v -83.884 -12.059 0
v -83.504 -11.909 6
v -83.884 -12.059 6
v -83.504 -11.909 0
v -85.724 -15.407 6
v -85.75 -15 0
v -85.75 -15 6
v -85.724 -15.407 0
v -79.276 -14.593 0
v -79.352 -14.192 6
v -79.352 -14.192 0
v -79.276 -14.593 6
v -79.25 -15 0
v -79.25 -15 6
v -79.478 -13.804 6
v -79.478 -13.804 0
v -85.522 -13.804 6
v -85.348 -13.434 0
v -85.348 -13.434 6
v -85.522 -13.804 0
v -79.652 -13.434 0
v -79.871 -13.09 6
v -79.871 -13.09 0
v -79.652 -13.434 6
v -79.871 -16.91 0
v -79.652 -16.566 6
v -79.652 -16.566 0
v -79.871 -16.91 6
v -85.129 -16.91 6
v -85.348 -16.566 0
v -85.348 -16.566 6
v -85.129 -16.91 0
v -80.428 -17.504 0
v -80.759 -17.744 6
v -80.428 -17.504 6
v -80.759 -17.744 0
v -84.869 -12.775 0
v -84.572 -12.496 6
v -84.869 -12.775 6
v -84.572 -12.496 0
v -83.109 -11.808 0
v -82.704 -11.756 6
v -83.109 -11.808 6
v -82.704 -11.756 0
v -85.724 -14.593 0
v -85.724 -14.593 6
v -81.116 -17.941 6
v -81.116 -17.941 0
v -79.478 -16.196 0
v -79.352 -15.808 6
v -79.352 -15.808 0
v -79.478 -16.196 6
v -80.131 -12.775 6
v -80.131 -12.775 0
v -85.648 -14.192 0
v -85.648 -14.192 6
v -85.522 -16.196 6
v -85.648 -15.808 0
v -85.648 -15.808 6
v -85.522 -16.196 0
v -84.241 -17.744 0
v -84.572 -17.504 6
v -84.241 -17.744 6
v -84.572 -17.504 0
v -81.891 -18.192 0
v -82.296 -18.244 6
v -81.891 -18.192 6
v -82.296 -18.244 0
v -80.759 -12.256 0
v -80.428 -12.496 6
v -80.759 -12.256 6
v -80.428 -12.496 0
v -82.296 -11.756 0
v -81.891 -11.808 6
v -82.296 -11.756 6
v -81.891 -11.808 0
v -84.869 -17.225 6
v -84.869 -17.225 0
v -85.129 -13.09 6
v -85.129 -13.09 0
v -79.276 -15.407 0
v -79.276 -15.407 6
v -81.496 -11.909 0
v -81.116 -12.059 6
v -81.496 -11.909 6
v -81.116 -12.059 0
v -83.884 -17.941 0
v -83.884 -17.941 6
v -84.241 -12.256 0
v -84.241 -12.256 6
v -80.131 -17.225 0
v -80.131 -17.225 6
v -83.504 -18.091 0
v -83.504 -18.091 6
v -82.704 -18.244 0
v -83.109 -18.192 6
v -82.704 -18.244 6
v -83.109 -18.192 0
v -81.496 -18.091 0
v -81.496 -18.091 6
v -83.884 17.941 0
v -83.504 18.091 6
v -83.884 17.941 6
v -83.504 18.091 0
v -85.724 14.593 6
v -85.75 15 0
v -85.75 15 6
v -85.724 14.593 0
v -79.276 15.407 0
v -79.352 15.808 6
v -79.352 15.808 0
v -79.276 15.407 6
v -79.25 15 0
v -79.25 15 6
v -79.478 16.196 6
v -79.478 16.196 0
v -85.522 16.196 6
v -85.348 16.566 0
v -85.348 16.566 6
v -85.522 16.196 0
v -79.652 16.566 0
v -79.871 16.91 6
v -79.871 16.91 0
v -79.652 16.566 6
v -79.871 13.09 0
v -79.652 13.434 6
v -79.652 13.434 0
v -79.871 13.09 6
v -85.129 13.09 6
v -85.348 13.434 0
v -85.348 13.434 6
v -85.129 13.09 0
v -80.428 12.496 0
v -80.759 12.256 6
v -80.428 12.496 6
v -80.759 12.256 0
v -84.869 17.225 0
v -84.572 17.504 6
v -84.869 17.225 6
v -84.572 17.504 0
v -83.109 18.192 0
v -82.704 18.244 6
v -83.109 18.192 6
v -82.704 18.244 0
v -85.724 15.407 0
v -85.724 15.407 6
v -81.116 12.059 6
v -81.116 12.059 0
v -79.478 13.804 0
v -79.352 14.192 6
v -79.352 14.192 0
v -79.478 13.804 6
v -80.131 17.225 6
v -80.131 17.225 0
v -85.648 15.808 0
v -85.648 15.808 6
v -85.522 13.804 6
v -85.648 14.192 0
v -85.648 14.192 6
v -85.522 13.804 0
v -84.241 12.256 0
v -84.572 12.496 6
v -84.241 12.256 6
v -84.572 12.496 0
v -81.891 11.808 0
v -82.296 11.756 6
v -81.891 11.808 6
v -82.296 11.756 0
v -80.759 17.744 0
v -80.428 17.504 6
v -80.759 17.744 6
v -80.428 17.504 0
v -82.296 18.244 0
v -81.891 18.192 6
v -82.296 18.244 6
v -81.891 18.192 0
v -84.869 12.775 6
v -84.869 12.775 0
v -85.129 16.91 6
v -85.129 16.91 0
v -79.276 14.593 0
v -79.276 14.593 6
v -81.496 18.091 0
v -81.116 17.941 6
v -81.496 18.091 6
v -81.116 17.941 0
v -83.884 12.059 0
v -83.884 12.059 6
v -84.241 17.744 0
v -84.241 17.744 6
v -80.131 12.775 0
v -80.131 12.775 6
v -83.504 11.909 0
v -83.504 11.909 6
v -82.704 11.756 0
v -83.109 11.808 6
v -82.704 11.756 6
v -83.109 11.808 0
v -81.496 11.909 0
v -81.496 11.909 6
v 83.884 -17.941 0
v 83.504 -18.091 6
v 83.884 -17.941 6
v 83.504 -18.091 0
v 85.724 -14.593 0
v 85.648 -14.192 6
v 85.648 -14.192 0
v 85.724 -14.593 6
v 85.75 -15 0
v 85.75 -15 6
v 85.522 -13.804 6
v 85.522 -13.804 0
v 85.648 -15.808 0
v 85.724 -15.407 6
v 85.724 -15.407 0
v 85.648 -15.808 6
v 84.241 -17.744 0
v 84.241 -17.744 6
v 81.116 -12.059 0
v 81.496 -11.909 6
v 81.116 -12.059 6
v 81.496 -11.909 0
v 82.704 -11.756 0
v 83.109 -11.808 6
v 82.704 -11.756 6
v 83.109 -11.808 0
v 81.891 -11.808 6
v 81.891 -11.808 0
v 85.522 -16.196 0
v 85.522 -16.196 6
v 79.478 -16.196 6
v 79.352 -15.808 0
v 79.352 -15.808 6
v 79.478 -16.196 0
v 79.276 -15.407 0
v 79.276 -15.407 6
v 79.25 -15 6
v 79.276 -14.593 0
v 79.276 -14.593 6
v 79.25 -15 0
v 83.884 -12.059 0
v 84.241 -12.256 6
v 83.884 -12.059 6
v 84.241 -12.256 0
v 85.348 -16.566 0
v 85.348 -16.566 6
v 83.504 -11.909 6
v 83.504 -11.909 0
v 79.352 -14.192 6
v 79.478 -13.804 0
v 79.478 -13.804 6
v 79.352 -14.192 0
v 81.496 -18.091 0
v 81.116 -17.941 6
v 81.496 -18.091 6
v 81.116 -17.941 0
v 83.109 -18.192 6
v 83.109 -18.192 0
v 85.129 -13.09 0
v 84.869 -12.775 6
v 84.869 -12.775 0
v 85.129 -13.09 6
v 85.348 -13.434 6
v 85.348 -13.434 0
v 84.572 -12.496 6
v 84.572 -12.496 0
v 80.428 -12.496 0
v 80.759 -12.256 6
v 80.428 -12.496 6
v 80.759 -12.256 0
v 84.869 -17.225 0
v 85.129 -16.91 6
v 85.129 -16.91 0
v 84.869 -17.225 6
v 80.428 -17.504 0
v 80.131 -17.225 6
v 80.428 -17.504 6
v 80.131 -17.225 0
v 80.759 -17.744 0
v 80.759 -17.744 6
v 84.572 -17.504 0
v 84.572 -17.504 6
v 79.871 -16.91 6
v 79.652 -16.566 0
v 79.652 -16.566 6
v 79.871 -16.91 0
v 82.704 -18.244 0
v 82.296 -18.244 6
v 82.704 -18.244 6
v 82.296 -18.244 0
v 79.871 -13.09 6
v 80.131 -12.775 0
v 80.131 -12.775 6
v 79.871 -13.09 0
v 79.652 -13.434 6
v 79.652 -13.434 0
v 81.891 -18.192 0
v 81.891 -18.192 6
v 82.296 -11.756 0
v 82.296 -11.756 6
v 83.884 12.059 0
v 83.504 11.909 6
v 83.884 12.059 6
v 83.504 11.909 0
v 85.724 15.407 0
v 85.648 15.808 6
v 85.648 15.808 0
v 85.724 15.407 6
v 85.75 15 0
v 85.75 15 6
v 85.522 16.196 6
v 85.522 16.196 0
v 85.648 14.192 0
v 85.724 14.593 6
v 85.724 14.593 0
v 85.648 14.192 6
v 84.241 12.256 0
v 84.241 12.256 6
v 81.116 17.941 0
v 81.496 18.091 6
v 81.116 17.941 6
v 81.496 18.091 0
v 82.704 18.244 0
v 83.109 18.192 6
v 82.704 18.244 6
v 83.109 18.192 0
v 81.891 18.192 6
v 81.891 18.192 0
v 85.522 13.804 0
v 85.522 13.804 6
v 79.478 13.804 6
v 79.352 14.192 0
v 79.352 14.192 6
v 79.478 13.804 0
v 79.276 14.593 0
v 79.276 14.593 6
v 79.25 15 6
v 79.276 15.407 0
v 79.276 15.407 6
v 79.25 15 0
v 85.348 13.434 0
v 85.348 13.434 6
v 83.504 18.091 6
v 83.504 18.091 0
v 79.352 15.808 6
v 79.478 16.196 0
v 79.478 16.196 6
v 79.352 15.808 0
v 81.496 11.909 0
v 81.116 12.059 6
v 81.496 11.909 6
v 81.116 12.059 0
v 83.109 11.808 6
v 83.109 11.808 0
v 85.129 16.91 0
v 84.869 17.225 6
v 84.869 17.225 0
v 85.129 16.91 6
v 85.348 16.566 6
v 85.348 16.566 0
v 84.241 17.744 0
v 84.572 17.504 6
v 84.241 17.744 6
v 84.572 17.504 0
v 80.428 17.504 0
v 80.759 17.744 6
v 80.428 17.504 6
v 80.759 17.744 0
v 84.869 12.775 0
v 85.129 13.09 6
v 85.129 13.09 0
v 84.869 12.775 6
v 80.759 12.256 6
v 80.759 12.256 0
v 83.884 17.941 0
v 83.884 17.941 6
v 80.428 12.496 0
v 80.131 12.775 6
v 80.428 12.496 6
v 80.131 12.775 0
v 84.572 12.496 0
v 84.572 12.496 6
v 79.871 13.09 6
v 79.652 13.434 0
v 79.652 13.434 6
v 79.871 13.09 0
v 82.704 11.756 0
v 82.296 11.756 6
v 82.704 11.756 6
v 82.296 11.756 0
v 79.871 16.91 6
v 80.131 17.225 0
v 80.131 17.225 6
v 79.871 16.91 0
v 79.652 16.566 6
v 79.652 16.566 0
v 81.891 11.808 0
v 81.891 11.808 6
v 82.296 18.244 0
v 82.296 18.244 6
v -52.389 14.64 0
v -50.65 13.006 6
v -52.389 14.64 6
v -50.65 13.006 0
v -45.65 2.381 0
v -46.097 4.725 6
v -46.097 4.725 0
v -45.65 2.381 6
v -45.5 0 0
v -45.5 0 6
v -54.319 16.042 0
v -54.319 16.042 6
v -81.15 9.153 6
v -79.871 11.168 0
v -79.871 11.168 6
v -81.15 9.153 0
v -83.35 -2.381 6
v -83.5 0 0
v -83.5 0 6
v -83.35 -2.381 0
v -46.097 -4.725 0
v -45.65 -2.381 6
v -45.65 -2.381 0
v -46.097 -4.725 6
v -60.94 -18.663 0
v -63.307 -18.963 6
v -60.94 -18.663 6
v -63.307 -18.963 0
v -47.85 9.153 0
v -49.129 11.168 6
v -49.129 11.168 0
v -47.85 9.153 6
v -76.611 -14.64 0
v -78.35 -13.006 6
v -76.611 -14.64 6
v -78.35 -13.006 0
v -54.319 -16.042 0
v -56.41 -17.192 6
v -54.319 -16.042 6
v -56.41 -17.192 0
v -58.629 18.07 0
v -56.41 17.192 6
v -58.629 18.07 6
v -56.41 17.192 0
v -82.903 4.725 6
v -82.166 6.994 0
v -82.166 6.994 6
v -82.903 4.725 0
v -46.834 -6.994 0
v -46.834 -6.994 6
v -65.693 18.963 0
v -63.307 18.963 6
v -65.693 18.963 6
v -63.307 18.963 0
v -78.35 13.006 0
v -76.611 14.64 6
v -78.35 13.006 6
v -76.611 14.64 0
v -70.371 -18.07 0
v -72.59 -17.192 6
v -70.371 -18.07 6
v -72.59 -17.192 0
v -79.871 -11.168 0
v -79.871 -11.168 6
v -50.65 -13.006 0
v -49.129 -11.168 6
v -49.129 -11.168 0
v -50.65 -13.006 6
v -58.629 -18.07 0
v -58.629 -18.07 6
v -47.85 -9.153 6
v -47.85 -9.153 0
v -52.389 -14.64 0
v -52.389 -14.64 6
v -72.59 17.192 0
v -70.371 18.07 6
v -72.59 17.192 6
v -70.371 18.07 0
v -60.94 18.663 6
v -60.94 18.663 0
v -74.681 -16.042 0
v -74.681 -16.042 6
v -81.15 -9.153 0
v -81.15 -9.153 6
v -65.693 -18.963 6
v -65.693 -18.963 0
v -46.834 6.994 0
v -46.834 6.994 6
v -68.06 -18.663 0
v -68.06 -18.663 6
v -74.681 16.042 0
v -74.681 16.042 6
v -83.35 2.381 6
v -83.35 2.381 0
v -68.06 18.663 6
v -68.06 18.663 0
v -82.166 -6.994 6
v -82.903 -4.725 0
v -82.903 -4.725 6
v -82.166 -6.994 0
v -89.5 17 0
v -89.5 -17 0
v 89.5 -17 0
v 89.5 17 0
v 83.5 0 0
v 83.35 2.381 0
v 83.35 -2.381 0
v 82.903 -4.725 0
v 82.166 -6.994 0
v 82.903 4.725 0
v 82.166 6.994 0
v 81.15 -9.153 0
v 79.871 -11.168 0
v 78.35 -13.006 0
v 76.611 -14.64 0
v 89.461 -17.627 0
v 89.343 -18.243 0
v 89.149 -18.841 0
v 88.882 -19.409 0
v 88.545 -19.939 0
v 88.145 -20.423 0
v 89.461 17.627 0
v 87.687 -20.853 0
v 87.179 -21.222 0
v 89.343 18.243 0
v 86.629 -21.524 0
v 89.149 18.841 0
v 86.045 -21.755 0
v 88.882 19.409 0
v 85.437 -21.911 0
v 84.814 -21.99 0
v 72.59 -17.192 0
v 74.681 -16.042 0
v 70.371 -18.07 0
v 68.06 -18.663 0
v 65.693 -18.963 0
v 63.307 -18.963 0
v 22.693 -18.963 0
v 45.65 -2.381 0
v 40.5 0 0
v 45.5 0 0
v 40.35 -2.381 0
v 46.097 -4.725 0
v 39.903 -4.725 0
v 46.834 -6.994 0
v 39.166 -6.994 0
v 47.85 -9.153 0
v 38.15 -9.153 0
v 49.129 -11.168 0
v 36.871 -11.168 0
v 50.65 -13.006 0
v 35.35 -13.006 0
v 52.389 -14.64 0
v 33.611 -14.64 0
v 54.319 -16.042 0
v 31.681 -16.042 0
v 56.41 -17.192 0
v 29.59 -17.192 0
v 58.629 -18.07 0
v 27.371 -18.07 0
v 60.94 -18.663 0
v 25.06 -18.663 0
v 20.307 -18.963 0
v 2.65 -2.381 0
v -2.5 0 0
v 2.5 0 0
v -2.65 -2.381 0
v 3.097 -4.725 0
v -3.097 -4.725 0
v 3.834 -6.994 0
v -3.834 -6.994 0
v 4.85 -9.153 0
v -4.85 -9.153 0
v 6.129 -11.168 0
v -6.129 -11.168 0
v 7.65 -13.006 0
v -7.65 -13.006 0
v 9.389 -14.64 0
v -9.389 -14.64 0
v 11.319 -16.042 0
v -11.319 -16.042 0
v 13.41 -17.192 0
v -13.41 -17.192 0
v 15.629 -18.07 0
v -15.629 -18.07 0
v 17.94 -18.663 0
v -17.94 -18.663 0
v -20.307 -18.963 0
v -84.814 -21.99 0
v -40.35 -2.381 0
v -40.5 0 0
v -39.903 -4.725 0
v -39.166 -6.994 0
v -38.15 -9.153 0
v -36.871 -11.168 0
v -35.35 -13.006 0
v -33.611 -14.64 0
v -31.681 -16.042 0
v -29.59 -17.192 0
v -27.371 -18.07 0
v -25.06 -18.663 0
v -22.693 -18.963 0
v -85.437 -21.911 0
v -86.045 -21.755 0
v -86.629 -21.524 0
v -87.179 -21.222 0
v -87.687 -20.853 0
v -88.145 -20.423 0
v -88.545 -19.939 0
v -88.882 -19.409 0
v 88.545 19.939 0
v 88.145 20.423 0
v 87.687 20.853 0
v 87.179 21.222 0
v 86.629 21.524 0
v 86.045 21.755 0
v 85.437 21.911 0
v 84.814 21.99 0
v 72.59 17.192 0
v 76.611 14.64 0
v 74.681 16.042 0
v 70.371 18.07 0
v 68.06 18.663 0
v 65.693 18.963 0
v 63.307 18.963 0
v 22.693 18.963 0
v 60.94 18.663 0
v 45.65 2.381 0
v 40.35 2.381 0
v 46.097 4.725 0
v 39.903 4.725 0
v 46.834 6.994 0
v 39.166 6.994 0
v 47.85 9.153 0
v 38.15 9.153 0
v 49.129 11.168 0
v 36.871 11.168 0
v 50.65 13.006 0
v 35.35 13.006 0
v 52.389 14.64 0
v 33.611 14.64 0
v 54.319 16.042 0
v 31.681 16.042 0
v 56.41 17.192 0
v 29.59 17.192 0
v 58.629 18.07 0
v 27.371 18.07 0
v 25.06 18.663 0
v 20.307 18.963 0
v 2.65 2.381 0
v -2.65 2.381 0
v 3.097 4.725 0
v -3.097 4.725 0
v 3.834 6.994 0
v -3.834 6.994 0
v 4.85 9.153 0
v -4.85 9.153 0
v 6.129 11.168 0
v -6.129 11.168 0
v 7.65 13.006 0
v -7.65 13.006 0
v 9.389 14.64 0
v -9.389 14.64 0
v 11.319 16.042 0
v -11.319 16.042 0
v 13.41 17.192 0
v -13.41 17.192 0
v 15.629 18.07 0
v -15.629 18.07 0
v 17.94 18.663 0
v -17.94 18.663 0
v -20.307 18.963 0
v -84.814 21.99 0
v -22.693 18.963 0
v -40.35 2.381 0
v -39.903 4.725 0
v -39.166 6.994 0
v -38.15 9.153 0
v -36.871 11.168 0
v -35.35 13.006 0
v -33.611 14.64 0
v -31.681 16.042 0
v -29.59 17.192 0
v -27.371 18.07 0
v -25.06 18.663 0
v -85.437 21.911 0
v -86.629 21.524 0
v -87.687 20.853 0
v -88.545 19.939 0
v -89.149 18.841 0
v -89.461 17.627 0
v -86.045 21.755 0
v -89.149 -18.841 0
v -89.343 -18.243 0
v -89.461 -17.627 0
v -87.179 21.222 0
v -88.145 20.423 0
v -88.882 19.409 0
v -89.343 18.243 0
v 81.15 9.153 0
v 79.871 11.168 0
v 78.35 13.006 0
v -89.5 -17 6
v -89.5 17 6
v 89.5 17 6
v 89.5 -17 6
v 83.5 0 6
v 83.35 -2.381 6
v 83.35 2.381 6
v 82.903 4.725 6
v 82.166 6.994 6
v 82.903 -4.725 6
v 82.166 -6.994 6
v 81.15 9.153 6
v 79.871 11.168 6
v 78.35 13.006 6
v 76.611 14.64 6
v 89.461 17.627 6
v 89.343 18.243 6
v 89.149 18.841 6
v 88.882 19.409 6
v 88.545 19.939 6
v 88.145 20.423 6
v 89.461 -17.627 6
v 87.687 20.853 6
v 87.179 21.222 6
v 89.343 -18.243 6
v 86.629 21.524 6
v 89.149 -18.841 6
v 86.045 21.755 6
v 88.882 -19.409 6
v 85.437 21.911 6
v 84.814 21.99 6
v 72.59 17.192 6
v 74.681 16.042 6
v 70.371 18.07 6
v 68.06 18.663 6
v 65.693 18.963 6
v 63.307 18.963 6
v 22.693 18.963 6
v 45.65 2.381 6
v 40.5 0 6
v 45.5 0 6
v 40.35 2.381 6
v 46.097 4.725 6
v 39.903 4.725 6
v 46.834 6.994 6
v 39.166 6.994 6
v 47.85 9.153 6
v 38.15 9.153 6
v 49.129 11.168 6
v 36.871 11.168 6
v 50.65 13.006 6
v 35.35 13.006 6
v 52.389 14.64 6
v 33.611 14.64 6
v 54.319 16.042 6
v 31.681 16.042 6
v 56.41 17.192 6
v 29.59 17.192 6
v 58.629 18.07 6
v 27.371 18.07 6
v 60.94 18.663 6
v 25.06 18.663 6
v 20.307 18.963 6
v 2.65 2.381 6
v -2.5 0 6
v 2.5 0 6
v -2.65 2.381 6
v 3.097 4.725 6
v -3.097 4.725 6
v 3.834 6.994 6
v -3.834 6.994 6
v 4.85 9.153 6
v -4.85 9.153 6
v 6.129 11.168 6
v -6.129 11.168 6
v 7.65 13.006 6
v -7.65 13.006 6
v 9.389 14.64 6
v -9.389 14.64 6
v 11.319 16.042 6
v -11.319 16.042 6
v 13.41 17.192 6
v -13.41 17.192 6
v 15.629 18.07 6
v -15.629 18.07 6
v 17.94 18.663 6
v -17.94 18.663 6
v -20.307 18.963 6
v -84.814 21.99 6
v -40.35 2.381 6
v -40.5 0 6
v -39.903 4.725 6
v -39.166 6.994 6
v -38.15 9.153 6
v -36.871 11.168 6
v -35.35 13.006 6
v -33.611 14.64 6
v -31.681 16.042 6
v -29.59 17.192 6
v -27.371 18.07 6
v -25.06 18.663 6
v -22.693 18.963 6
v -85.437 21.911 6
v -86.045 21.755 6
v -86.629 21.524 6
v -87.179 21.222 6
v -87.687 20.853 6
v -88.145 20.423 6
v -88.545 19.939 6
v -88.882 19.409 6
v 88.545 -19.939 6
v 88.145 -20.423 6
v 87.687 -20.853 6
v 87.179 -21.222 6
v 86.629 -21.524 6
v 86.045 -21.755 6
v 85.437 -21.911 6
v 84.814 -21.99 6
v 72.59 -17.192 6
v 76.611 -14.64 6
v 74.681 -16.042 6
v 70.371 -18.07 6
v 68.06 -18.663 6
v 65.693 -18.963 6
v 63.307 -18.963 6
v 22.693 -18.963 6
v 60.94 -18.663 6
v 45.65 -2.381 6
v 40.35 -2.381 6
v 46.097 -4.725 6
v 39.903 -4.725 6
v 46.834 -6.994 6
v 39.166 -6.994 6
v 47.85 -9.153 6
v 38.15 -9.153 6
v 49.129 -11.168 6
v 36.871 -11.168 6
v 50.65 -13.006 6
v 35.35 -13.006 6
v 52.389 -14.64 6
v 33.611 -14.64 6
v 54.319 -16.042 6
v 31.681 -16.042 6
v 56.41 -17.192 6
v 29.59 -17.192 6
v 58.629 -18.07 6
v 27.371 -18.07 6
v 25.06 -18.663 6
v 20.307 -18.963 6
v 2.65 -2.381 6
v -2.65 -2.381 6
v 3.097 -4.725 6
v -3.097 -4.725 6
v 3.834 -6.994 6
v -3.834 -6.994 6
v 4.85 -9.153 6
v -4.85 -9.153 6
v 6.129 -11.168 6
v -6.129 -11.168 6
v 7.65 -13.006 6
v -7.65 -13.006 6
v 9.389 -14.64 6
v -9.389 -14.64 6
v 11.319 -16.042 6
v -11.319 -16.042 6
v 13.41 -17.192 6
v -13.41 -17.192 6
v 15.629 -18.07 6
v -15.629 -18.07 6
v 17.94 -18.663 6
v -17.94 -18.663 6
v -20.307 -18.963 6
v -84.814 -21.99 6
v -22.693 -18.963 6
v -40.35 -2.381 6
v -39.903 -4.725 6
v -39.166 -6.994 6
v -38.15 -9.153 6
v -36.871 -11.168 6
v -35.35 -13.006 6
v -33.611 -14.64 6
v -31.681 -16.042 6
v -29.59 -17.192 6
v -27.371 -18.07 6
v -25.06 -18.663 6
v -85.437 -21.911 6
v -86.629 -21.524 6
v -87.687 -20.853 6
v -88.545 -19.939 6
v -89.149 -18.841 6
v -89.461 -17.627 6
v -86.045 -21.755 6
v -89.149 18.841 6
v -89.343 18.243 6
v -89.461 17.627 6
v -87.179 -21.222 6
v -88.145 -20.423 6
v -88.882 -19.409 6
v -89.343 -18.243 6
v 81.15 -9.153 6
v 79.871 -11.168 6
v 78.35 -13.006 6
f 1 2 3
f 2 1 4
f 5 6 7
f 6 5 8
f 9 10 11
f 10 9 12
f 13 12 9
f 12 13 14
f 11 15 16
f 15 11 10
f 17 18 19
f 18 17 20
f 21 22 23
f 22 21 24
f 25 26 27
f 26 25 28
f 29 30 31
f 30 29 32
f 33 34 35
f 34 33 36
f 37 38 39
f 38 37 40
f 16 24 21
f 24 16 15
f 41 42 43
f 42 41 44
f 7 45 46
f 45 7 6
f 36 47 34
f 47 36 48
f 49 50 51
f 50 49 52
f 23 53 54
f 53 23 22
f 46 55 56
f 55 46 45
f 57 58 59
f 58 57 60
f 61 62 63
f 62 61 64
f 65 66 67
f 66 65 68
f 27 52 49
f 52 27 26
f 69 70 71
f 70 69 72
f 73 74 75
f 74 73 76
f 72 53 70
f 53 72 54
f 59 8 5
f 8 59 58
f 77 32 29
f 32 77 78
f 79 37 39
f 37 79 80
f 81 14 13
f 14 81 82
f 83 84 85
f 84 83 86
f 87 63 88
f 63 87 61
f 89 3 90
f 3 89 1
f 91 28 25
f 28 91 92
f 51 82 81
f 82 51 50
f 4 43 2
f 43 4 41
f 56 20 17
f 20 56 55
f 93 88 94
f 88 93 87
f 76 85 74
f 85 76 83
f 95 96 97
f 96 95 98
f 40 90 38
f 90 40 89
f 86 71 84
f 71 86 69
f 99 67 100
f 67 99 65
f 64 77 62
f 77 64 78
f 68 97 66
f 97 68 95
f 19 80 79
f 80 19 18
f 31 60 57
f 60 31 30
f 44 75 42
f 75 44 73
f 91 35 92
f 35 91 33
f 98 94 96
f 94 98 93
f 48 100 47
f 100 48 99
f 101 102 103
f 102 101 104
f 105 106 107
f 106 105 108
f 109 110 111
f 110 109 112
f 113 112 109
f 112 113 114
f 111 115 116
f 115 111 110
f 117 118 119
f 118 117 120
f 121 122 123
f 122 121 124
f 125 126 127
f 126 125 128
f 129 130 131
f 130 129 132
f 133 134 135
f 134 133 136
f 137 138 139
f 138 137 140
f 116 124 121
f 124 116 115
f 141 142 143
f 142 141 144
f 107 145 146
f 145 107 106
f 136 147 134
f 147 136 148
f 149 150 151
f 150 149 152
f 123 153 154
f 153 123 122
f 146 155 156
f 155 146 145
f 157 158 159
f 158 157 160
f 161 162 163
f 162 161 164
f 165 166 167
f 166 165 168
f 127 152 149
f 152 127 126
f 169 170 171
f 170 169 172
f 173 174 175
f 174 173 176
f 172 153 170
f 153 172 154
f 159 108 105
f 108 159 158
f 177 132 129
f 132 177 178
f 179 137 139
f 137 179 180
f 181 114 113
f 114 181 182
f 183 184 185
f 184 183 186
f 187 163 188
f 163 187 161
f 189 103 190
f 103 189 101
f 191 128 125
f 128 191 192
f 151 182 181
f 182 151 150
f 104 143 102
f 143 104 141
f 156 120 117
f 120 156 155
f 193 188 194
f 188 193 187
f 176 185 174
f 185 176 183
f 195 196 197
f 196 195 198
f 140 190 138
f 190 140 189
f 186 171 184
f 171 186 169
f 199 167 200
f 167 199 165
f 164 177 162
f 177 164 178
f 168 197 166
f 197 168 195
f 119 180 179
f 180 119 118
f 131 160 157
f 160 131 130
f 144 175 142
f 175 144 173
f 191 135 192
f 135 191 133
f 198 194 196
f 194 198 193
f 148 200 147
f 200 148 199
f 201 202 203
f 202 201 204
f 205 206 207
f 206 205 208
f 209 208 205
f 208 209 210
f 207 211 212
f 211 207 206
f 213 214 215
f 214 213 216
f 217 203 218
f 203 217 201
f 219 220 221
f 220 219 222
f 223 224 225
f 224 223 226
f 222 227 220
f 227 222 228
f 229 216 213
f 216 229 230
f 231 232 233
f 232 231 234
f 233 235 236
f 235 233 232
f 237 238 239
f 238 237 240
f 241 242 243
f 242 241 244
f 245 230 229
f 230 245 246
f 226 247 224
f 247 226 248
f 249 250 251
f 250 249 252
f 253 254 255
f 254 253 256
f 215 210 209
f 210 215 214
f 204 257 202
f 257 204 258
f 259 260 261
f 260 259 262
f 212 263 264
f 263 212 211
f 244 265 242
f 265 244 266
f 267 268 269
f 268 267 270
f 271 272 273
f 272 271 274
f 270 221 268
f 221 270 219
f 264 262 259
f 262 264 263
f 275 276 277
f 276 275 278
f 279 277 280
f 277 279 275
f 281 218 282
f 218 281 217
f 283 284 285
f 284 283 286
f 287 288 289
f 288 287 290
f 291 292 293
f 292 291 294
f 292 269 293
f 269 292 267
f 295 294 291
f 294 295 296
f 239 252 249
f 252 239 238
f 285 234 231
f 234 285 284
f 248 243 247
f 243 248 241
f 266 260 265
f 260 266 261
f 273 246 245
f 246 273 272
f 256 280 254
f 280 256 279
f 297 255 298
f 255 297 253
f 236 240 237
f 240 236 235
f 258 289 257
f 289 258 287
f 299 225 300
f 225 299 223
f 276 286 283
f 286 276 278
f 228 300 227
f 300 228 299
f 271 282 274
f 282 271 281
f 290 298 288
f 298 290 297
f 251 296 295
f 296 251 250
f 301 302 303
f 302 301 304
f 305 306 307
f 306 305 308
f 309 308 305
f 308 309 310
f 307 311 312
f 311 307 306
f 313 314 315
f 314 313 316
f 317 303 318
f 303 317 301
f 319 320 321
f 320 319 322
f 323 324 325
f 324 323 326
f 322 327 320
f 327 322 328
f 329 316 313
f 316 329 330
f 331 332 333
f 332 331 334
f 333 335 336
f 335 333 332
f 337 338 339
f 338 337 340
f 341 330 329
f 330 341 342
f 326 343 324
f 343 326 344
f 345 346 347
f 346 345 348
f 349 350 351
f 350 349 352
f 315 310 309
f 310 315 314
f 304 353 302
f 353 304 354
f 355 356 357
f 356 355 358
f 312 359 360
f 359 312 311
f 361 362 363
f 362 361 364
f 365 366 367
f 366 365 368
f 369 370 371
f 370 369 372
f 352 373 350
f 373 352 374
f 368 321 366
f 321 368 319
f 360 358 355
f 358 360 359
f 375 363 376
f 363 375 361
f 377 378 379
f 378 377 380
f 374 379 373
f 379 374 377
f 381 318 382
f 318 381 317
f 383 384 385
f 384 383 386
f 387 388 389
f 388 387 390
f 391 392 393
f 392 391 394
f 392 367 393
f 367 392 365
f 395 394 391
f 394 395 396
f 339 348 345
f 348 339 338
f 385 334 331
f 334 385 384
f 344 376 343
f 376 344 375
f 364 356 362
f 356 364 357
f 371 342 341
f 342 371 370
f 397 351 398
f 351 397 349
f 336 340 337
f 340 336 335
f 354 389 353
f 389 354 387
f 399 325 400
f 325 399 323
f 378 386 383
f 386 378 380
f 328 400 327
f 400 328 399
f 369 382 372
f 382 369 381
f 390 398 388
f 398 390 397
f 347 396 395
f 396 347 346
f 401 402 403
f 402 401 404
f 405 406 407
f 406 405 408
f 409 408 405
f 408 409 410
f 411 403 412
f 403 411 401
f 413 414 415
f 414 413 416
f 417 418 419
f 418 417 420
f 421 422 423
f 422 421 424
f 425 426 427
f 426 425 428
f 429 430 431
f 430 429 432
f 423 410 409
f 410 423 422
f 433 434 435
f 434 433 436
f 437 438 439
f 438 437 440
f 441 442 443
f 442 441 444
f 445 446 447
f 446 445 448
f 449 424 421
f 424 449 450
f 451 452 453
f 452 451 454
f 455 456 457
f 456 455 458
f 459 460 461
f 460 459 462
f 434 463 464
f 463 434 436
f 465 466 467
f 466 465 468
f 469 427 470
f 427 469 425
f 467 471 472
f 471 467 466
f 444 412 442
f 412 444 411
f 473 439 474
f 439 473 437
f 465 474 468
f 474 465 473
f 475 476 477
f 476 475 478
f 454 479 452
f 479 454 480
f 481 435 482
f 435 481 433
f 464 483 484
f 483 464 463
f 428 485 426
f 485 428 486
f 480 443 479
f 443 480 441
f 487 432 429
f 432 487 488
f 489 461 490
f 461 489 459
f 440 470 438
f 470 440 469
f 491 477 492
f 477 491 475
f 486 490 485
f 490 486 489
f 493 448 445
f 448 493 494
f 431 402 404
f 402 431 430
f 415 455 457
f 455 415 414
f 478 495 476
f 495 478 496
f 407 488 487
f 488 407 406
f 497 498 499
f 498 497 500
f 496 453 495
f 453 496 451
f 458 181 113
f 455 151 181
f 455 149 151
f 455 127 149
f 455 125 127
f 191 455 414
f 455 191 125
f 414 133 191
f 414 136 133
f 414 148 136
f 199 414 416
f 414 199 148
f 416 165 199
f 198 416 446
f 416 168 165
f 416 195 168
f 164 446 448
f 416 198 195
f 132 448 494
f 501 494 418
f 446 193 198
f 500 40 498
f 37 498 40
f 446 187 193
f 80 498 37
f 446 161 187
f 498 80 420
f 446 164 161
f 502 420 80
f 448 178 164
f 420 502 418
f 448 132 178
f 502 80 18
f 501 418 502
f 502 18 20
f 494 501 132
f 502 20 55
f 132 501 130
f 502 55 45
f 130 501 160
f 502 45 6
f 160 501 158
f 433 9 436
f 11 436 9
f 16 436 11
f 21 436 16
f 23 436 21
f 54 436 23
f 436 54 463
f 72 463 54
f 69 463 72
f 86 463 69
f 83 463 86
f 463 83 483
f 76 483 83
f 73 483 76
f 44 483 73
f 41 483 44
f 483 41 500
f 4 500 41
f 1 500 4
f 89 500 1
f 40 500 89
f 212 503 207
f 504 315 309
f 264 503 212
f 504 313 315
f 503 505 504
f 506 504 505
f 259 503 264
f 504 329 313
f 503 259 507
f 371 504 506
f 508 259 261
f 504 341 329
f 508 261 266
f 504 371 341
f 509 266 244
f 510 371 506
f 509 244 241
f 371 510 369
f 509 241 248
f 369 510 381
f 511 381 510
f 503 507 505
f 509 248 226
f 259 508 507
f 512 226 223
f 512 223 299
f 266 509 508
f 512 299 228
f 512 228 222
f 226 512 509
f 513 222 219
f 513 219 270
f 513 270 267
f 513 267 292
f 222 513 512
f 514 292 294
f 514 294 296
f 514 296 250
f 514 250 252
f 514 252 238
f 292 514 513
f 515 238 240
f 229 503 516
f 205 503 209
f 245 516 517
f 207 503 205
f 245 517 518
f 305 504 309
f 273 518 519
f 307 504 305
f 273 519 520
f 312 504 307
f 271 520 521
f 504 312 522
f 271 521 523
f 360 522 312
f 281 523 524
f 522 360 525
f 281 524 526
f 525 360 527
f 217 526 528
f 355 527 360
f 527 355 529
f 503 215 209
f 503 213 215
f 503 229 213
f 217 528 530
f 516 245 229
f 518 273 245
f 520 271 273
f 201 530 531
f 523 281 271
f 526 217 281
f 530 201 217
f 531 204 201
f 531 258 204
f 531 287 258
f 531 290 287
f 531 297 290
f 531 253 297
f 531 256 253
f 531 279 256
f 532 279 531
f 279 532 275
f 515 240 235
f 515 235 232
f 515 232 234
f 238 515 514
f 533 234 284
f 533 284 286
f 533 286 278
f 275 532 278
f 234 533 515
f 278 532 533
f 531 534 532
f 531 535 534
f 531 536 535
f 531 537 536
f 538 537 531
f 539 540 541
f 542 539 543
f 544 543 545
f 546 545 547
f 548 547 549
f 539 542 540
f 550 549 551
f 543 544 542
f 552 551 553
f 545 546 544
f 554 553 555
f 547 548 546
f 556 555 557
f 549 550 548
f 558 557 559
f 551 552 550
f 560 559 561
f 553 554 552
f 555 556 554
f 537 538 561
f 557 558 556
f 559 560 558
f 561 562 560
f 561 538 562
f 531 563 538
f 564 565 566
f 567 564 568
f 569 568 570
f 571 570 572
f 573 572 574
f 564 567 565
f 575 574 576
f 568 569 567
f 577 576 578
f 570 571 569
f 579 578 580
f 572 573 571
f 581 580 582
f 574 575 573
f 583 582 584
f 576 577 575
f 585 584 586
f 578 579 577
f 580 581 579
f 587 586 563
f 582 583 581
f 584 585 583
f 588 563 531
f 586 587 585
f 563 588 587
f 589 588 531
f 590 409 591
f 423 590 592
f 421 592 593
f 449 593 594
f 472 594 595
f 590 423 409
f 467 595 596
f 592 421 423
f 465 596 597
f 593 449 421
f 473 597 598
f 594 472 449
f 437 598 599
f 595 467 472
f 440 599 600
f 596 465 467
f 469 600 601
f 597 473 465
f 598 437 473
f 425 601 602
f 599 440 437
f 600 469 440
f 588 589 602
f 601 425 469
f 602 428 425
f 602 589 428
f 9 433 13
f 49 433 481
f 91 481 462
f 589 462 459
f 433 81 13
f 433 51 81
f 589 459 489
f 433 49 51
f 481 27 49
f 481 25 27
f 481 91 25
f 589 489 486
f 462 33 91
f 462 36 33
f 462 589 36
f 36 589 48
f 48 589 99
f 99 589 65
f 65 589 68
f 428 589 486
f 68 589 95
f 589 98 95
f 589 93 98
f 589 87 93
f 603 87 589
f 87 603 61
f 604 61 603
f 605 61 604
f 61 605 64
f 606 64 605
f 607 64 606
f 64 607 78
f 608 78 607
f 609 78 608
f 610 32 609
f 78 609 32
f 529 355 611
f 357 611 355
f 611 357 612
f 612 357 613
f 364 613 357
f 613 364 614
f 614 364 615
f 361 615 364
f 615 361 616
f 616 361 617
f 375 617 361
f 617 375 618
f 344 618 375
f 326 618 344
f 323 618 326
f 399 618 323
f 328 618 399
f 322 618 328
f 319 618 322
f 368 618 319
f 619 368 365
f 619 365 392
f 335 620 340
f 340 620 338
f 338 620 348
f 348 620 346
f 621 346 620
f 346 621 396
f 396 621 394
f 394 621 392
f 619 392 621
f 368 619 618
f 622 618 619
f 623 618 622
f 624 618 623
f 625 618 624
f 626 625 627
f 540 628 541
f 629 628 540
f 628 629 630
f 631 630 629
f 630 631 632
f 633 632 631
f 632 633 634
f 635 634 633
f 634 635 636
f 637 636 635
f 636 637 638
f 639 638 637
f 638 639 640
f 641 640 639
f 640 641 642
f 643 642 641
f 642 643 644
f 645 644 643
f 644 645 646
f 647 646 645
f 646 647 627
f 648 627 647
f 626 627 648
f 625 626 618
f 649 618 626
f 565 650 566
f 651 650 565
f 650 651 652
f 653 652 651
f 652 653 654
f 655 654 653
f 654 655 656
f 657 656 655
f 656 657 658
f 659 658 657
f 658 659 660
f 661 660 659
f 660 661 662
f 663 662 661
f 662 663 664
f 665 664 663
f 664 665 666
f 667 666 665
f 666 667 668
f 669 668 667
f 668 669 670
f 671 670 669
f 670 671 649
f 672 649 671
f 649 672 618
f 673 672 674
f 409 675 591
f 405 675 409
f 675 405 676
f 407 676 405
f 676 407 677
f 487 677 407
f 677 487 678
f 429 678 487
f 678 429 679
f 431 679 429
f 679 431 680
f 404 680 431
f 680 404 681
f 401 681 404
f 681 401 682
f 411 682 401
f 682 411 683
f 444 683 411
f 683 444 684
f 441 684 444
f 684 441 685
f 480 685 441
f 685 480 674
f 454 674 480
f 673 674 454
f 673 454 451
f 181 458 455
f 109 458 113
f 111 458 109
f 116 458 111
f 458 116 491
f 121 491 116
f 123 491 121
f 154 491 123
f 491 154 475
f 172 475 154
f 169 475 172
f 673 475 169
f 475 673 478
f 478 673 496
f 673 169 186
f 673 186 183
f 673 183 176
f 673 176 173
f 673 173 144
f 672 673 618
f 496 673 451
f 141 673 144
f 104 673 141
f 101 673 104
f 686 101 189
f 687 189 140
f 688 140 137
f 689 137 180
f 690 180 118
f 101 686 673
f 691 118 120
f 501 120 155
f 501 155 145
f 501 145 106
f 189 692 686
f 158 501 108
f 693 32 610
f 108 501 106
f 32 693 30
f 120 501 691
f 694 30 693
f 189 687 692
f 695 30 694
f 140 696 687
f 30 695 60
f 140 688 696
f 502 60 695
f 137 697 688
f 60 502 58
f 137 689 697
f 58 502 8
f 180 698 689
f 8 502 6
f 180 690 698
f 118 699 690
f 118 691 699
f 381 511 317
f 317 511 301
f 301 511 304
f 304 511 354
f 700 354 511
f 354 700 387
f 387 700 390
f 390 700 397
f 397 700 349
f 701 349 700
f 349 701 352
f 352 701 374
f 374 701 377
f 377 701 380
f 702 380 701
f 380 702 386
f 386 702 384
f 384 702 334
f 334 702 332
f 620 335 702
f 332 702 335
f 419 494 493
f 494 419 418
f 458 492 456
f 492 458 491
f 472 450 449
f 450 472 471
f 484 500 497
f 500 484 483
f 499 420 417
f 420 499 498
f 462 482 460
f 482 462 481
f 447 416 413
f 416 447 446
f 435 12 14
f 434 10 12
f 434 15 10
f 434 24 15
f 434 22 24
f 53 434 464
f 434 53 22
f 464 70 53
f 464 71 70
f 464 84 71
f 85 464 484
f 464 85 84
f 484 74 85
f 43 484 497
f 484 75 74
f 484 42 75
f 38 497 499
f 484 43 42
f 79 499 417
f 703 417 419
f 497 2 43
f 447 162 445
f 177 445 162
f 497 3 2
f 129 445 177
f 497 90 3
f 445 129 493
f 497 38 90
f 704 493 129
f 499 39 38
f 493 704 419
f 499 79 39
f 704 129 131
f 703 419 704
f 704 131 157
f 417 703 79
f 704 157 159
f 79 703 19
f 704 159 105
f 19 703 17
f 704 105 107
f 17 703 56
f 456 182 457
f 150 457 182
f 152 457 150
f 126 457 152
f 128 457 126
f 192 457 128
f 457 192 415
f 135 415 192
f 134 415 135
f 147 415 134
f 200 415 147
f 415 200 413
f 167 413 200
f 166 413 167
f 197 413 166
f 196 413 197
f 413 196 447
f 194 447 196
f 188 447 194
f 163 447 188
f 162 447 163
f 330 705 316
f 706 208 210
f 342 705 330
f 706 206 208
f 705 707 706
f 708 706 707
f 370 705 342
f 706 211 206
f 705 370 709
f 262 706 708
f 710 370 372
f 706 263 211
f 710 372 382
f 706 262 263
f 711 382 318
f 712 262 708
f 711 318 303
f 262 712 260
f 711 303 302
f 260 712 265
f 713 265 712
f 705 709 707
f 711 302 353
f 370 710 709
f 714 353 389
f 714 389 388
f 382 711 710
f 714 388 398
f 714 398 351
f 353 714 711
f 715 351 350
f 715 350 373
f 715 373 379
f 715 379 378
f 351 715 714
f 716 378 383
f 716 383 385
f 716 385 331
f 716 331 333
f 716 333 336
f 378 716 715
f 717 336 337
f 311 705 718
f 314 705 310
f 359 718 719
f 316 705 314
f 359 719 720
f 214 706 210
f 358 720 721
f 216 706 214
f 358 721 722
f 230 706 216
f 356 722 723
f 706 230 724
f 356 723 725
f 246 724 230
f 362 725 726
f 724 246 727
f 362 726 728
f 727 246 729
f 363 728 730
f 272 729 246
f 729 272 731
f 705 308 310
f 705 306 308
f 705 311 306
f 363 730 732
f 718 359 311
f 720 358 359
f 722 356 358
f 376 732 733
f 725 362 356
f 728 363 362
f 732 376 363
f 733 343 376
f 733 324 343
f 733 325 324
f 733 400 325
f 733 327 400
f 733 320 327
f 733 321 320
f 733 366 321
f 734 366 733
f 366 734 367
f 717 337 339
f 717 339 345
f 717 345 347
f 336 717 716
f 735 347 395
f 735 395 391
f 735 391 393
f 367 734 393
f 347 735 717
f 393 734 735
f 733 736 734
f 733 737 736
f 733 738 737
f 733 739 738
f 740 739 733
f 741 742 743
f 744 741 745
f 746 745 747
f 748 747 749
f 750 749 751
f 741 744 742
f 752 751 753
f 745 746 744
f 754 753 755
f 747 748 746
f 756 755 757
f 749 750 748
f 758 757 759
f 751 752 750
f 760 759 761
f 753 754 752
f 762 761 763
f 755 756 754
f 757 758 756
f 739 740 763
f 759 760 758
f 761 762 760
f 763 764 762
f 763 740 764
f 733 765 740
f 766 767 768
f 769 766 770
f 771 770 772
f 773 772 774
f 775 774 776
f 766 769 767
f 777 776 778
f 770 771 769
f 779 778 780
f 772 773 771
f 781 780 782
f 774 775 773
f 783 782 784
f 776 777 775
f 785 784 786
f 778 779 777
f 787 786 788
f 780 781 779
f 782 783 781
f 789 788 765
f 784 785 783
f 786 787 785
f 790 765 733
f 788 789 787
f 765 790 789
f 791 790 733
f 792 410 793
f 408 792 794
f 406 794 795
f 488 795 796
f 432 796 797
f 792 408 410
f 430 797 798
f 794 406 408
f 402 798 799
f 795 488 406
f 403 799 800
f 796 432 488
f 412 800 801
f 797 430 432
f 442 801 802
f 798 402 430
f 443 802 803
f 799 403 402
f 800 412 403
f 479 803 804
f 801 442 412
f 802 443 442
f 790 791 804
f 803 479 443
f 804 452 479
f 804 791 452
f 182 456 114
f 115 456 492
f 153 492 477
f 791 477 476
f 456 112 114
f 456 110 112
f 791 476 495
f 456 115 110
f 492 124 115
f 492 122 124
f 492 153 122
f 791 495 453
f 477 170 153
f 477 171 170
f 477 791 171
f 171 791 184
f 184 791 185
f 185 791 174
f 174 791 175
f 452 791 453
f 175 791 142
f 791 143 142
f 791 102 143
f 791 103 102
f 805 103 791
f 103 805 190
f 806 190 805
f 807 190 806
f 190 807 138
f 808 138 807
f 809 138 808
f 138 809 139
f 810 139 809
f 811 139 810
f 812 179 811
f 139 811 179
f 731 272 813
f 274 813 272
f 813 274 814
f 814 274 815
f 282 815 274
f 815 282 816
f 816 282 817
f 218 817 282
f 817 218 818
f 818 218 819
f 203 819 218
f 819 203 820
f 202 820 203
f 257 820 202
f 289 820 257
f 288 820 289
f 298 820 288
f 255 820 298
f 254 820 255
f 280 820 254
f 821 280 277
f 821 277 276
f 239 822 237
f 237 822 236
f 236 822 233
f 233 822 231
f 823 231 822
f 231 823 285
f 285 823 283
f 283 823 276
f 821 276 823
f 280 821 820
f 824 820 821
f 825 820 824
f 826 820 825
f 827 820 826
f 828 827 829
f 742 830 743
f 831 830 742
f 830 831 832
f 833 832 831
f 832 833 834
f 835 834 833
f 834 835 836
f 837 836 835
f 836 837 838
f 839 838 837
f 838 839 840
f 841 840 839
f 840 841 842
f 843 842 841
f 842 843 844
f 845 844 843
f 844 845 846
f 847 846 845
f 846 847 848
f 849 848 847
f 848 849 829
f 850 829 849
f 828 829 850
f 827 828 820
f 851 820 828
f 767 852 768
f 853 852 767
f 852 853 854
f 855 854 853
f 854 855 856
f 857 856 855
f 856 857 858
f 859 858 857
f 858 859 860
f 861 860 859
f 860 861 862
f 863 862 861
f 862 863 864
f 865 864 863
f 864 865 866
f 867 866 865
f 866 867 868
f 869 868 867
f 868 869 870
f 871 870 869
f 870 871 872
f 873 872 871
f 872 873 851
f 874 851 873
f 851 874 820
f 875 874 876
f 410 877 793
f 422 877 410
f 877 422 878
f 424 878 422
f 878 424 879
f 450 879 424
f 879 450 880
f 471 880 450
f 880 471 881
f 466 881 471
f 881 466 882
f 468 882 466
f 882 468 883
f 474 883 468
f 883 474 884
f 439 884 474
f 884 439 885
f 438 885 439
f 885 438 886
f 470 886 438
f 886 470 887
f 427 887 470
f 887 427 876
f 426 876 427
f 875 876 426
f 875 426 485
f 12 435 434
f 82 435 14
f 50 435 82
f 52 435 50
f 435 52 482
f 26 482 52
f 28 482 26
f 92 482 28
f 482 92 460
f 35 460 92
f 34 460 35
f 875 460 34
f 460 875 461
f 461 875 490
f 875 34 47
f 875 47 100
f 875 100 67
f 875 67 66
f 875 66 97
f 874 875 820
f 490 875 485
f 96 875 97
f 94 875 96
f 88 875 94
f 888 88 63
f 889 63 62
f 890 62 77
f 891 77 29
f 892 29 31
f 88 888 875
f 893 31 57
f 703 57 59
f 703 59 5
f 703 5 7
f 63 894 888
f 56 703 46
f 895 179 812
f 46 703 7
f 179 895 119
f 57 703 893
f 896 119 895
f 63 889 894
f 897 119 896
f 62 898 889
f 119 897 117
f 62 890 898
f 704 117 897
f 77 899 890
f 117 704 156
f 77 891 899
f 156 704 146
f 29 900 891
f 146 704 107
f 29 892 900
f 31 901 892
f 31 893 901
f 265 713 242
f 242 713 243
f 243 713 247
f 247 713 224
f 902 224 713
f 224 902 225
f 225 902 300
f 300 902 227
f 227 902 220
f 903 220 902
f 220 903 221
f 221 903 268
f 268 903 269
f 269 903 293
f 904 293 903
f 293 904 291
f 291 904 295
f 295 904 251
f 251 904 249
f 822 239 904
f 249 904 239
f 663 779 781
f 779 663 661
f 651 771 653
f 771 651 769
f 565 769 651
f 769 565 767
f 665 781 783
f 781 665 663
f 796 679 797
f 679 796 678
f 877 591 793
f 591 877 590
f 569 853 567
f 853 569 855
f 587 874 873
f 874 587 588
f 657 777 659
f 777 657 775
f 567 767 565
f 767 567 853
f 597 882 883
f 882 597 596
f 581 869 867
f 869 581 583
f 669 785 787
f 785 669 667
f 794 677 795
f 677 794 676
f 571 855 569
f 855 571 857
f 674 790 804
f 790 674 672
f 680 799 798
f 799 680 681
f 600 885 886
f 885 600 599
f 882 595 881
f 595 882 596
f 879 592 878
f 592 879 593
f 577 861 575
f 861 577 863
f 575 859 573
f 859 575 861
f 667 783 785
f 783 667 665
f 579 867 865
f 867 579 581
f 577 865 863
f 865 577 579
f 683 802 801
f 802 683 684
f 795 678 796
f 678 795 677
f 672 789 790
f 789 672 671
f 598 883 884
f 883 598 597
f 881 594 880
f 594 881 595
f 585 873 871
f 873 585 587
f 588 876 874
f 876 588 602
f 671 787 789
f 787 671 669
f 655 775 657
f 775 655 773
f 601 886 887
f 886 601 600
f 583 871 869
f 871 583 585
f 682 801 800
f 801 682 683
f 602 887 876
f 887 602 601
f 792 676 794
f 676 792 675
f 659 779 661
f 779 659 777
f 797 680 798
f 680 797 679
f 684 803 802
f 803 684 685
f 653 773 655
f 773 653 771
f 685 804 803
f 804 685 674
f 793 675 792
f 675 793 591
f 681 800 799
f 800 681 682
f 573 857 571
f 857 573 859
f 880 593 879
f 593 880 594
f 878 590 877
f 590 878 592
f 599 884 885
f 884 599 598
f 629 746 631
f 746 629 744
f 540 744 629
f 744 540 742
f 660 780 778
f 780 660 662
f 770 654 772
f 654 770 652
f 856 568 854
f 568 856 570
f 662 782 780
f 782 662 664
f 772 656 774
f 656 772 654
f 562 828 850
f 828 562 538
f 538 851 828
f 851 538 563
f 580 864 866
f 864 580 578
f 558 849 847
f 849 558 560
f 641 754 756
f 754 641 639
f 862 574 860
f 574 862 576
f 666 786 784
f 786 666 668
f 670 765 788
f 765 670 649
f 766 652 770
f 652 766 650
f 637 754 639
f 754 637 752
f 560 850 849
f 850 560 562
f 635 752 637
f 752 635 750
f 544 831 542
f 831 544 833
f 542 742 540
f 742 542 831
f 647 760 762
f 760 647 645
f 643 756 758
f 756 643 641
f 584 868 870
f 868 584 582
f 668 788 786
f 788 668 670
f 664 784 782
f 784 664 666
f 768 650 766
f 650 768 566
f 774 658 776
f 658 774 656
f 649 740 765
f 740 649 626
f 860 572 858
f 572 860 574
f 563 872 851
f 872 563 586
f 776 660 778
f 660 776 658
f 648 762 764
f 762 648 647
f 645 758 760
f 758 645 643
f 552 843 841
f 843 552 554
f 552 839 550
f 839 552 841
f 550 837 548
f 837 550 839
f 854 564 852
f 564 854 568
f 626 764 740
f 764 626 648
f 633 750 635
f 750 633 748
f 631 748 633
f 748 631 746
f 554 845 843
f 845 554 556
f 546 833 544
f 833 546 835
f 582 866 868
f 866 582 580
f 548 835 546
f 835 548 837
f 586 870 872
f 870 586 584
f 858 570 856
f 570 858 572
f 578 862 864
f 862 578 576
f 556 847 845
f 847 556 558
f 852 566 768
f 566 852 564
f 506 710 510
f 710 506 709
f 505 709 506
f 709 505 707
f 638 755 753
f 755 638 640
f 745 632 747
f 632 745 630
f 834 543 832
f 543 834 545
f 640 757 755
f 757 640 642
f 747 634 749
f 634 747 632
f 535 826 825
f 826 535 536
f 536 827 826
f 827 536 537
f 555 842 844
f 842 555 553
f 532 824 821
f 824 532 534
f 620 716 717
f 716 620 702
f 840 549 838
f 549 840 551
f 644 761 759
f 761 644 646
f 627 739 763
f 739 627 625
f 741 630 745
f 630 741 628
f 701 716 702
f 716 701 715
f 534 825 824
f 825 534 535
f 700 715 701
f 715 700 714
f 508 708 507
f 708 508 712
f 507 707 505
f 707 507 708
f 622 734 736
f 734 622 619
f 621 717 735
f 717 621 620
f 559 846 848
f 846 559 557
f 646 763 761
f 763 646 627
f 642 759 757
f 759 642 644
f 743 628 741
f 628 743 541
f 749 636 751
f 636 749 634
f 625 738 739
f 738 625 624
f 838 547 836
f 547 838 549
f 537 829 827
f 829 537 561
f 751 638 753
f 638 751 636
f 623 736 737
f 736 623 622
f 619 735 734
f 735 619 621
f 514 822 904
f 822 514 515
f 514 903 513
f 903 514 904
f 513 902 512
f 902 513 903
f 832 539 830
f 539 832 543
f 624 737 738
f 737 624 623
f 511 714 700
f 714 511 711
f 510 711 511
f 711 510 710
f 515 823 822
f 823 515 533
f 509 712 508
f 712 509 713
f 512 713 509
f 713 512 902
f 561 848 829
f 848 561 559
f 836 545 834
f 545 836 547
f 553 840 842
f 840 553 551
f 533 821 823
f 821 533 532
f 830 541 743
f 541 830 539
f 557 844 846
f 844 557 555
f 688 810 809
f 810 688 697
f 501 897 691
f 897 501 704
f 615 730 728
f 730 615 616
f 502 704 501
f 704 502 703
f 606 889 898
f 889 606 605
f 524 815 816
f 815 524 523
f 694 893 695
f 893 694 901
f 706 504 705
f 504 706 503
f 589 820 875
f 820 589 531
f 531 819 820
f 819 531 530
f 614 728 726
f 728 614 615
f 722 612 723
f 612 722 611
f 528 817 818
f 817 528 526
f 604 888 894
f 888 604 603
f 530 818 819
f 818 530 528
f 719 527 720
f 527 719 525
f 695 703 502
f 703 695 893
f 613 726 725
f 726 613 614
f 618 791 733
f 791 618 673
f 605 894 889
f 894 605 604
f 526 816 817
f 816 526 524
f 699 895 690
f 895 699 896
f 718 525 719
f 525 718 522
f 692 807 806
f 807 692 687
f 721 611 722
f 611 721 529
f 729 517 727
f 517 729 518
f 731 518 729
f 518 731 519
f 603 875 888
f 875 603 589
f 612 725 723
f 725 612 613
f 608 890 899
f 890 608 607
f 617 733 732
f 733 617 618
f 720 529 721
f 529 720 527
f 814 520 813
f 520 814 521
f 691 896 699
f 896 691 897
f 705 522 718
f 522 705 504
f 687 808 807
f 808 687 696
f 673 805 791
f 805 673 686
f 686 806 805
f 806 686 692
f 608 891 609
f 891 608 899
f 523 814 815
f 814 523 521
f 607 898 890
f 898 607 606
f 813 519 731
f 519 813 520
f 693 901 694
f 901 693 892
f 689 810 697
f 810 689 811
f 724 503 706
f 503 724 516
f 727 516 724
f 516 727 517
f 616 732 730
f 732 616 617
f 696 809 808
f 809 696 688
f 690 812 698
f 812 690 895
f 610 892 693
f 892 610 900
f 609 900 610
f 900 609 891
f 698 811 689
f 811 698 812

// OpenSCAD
$fn = 50;


difference() {
	union() {
		hull() {
			translate(v = [-84.5000000000, 17.0000000000, 0]) {
				cylinder(h = 6, r = 5);
			}
			translate(v = [84.5000000000, 17.0000000000, 0]) {
				cylinder(h = 6, r = 5);
			}
			translate(v = [-84.5000000000, -17.0000000000, 0]) {
				cylinder(h = 6, r = 5);
			}
			translate(v = [84.5000000000, -17.0000000000, 0]) {
				cylinder(h = 6, r = 5);
			}
		}
	}
	union() {
		#translate(v = [-82.5000000000, -15.0000000000, -100.0000000000]) {
			cylinder(h = 200, r = 3.2500000000);
		}
		#translate(v = [-82.5000000000, 15.0000000000, -100.0000000000]) {
			cylinder(h = 200, r = 3.2500000000);
		}
		#translate(v = [82.5000000000, -15.0000000000, -100.0000000000]) {
			cylinder(h = 200, r = 3.2500000000);
		}
		#translate(v = [82.5000000000, 15.0000000000, -100.0000000000]) {
			cylinder(h = 200, r = 3.2500000000);
		}
		#translate(v = [-64.5000000000, 0, 0]) {
			cylinder(h = 6, r = 19.0000000000);
		}
		#translate(v = [-21.5000000000, 0, 0]) {
			cylinder(h = 6, r = 19.0000000000);
		}
		#translate(v = [21.5000000000, 0, 0]) {
			cylinder(h = 6, r = 19.0000000000);
		}
		#translate(v = [64.5000000000, 0, 0]) {
			cylinder(h = 6, r = 19.0000000000);
		}
	}
}
